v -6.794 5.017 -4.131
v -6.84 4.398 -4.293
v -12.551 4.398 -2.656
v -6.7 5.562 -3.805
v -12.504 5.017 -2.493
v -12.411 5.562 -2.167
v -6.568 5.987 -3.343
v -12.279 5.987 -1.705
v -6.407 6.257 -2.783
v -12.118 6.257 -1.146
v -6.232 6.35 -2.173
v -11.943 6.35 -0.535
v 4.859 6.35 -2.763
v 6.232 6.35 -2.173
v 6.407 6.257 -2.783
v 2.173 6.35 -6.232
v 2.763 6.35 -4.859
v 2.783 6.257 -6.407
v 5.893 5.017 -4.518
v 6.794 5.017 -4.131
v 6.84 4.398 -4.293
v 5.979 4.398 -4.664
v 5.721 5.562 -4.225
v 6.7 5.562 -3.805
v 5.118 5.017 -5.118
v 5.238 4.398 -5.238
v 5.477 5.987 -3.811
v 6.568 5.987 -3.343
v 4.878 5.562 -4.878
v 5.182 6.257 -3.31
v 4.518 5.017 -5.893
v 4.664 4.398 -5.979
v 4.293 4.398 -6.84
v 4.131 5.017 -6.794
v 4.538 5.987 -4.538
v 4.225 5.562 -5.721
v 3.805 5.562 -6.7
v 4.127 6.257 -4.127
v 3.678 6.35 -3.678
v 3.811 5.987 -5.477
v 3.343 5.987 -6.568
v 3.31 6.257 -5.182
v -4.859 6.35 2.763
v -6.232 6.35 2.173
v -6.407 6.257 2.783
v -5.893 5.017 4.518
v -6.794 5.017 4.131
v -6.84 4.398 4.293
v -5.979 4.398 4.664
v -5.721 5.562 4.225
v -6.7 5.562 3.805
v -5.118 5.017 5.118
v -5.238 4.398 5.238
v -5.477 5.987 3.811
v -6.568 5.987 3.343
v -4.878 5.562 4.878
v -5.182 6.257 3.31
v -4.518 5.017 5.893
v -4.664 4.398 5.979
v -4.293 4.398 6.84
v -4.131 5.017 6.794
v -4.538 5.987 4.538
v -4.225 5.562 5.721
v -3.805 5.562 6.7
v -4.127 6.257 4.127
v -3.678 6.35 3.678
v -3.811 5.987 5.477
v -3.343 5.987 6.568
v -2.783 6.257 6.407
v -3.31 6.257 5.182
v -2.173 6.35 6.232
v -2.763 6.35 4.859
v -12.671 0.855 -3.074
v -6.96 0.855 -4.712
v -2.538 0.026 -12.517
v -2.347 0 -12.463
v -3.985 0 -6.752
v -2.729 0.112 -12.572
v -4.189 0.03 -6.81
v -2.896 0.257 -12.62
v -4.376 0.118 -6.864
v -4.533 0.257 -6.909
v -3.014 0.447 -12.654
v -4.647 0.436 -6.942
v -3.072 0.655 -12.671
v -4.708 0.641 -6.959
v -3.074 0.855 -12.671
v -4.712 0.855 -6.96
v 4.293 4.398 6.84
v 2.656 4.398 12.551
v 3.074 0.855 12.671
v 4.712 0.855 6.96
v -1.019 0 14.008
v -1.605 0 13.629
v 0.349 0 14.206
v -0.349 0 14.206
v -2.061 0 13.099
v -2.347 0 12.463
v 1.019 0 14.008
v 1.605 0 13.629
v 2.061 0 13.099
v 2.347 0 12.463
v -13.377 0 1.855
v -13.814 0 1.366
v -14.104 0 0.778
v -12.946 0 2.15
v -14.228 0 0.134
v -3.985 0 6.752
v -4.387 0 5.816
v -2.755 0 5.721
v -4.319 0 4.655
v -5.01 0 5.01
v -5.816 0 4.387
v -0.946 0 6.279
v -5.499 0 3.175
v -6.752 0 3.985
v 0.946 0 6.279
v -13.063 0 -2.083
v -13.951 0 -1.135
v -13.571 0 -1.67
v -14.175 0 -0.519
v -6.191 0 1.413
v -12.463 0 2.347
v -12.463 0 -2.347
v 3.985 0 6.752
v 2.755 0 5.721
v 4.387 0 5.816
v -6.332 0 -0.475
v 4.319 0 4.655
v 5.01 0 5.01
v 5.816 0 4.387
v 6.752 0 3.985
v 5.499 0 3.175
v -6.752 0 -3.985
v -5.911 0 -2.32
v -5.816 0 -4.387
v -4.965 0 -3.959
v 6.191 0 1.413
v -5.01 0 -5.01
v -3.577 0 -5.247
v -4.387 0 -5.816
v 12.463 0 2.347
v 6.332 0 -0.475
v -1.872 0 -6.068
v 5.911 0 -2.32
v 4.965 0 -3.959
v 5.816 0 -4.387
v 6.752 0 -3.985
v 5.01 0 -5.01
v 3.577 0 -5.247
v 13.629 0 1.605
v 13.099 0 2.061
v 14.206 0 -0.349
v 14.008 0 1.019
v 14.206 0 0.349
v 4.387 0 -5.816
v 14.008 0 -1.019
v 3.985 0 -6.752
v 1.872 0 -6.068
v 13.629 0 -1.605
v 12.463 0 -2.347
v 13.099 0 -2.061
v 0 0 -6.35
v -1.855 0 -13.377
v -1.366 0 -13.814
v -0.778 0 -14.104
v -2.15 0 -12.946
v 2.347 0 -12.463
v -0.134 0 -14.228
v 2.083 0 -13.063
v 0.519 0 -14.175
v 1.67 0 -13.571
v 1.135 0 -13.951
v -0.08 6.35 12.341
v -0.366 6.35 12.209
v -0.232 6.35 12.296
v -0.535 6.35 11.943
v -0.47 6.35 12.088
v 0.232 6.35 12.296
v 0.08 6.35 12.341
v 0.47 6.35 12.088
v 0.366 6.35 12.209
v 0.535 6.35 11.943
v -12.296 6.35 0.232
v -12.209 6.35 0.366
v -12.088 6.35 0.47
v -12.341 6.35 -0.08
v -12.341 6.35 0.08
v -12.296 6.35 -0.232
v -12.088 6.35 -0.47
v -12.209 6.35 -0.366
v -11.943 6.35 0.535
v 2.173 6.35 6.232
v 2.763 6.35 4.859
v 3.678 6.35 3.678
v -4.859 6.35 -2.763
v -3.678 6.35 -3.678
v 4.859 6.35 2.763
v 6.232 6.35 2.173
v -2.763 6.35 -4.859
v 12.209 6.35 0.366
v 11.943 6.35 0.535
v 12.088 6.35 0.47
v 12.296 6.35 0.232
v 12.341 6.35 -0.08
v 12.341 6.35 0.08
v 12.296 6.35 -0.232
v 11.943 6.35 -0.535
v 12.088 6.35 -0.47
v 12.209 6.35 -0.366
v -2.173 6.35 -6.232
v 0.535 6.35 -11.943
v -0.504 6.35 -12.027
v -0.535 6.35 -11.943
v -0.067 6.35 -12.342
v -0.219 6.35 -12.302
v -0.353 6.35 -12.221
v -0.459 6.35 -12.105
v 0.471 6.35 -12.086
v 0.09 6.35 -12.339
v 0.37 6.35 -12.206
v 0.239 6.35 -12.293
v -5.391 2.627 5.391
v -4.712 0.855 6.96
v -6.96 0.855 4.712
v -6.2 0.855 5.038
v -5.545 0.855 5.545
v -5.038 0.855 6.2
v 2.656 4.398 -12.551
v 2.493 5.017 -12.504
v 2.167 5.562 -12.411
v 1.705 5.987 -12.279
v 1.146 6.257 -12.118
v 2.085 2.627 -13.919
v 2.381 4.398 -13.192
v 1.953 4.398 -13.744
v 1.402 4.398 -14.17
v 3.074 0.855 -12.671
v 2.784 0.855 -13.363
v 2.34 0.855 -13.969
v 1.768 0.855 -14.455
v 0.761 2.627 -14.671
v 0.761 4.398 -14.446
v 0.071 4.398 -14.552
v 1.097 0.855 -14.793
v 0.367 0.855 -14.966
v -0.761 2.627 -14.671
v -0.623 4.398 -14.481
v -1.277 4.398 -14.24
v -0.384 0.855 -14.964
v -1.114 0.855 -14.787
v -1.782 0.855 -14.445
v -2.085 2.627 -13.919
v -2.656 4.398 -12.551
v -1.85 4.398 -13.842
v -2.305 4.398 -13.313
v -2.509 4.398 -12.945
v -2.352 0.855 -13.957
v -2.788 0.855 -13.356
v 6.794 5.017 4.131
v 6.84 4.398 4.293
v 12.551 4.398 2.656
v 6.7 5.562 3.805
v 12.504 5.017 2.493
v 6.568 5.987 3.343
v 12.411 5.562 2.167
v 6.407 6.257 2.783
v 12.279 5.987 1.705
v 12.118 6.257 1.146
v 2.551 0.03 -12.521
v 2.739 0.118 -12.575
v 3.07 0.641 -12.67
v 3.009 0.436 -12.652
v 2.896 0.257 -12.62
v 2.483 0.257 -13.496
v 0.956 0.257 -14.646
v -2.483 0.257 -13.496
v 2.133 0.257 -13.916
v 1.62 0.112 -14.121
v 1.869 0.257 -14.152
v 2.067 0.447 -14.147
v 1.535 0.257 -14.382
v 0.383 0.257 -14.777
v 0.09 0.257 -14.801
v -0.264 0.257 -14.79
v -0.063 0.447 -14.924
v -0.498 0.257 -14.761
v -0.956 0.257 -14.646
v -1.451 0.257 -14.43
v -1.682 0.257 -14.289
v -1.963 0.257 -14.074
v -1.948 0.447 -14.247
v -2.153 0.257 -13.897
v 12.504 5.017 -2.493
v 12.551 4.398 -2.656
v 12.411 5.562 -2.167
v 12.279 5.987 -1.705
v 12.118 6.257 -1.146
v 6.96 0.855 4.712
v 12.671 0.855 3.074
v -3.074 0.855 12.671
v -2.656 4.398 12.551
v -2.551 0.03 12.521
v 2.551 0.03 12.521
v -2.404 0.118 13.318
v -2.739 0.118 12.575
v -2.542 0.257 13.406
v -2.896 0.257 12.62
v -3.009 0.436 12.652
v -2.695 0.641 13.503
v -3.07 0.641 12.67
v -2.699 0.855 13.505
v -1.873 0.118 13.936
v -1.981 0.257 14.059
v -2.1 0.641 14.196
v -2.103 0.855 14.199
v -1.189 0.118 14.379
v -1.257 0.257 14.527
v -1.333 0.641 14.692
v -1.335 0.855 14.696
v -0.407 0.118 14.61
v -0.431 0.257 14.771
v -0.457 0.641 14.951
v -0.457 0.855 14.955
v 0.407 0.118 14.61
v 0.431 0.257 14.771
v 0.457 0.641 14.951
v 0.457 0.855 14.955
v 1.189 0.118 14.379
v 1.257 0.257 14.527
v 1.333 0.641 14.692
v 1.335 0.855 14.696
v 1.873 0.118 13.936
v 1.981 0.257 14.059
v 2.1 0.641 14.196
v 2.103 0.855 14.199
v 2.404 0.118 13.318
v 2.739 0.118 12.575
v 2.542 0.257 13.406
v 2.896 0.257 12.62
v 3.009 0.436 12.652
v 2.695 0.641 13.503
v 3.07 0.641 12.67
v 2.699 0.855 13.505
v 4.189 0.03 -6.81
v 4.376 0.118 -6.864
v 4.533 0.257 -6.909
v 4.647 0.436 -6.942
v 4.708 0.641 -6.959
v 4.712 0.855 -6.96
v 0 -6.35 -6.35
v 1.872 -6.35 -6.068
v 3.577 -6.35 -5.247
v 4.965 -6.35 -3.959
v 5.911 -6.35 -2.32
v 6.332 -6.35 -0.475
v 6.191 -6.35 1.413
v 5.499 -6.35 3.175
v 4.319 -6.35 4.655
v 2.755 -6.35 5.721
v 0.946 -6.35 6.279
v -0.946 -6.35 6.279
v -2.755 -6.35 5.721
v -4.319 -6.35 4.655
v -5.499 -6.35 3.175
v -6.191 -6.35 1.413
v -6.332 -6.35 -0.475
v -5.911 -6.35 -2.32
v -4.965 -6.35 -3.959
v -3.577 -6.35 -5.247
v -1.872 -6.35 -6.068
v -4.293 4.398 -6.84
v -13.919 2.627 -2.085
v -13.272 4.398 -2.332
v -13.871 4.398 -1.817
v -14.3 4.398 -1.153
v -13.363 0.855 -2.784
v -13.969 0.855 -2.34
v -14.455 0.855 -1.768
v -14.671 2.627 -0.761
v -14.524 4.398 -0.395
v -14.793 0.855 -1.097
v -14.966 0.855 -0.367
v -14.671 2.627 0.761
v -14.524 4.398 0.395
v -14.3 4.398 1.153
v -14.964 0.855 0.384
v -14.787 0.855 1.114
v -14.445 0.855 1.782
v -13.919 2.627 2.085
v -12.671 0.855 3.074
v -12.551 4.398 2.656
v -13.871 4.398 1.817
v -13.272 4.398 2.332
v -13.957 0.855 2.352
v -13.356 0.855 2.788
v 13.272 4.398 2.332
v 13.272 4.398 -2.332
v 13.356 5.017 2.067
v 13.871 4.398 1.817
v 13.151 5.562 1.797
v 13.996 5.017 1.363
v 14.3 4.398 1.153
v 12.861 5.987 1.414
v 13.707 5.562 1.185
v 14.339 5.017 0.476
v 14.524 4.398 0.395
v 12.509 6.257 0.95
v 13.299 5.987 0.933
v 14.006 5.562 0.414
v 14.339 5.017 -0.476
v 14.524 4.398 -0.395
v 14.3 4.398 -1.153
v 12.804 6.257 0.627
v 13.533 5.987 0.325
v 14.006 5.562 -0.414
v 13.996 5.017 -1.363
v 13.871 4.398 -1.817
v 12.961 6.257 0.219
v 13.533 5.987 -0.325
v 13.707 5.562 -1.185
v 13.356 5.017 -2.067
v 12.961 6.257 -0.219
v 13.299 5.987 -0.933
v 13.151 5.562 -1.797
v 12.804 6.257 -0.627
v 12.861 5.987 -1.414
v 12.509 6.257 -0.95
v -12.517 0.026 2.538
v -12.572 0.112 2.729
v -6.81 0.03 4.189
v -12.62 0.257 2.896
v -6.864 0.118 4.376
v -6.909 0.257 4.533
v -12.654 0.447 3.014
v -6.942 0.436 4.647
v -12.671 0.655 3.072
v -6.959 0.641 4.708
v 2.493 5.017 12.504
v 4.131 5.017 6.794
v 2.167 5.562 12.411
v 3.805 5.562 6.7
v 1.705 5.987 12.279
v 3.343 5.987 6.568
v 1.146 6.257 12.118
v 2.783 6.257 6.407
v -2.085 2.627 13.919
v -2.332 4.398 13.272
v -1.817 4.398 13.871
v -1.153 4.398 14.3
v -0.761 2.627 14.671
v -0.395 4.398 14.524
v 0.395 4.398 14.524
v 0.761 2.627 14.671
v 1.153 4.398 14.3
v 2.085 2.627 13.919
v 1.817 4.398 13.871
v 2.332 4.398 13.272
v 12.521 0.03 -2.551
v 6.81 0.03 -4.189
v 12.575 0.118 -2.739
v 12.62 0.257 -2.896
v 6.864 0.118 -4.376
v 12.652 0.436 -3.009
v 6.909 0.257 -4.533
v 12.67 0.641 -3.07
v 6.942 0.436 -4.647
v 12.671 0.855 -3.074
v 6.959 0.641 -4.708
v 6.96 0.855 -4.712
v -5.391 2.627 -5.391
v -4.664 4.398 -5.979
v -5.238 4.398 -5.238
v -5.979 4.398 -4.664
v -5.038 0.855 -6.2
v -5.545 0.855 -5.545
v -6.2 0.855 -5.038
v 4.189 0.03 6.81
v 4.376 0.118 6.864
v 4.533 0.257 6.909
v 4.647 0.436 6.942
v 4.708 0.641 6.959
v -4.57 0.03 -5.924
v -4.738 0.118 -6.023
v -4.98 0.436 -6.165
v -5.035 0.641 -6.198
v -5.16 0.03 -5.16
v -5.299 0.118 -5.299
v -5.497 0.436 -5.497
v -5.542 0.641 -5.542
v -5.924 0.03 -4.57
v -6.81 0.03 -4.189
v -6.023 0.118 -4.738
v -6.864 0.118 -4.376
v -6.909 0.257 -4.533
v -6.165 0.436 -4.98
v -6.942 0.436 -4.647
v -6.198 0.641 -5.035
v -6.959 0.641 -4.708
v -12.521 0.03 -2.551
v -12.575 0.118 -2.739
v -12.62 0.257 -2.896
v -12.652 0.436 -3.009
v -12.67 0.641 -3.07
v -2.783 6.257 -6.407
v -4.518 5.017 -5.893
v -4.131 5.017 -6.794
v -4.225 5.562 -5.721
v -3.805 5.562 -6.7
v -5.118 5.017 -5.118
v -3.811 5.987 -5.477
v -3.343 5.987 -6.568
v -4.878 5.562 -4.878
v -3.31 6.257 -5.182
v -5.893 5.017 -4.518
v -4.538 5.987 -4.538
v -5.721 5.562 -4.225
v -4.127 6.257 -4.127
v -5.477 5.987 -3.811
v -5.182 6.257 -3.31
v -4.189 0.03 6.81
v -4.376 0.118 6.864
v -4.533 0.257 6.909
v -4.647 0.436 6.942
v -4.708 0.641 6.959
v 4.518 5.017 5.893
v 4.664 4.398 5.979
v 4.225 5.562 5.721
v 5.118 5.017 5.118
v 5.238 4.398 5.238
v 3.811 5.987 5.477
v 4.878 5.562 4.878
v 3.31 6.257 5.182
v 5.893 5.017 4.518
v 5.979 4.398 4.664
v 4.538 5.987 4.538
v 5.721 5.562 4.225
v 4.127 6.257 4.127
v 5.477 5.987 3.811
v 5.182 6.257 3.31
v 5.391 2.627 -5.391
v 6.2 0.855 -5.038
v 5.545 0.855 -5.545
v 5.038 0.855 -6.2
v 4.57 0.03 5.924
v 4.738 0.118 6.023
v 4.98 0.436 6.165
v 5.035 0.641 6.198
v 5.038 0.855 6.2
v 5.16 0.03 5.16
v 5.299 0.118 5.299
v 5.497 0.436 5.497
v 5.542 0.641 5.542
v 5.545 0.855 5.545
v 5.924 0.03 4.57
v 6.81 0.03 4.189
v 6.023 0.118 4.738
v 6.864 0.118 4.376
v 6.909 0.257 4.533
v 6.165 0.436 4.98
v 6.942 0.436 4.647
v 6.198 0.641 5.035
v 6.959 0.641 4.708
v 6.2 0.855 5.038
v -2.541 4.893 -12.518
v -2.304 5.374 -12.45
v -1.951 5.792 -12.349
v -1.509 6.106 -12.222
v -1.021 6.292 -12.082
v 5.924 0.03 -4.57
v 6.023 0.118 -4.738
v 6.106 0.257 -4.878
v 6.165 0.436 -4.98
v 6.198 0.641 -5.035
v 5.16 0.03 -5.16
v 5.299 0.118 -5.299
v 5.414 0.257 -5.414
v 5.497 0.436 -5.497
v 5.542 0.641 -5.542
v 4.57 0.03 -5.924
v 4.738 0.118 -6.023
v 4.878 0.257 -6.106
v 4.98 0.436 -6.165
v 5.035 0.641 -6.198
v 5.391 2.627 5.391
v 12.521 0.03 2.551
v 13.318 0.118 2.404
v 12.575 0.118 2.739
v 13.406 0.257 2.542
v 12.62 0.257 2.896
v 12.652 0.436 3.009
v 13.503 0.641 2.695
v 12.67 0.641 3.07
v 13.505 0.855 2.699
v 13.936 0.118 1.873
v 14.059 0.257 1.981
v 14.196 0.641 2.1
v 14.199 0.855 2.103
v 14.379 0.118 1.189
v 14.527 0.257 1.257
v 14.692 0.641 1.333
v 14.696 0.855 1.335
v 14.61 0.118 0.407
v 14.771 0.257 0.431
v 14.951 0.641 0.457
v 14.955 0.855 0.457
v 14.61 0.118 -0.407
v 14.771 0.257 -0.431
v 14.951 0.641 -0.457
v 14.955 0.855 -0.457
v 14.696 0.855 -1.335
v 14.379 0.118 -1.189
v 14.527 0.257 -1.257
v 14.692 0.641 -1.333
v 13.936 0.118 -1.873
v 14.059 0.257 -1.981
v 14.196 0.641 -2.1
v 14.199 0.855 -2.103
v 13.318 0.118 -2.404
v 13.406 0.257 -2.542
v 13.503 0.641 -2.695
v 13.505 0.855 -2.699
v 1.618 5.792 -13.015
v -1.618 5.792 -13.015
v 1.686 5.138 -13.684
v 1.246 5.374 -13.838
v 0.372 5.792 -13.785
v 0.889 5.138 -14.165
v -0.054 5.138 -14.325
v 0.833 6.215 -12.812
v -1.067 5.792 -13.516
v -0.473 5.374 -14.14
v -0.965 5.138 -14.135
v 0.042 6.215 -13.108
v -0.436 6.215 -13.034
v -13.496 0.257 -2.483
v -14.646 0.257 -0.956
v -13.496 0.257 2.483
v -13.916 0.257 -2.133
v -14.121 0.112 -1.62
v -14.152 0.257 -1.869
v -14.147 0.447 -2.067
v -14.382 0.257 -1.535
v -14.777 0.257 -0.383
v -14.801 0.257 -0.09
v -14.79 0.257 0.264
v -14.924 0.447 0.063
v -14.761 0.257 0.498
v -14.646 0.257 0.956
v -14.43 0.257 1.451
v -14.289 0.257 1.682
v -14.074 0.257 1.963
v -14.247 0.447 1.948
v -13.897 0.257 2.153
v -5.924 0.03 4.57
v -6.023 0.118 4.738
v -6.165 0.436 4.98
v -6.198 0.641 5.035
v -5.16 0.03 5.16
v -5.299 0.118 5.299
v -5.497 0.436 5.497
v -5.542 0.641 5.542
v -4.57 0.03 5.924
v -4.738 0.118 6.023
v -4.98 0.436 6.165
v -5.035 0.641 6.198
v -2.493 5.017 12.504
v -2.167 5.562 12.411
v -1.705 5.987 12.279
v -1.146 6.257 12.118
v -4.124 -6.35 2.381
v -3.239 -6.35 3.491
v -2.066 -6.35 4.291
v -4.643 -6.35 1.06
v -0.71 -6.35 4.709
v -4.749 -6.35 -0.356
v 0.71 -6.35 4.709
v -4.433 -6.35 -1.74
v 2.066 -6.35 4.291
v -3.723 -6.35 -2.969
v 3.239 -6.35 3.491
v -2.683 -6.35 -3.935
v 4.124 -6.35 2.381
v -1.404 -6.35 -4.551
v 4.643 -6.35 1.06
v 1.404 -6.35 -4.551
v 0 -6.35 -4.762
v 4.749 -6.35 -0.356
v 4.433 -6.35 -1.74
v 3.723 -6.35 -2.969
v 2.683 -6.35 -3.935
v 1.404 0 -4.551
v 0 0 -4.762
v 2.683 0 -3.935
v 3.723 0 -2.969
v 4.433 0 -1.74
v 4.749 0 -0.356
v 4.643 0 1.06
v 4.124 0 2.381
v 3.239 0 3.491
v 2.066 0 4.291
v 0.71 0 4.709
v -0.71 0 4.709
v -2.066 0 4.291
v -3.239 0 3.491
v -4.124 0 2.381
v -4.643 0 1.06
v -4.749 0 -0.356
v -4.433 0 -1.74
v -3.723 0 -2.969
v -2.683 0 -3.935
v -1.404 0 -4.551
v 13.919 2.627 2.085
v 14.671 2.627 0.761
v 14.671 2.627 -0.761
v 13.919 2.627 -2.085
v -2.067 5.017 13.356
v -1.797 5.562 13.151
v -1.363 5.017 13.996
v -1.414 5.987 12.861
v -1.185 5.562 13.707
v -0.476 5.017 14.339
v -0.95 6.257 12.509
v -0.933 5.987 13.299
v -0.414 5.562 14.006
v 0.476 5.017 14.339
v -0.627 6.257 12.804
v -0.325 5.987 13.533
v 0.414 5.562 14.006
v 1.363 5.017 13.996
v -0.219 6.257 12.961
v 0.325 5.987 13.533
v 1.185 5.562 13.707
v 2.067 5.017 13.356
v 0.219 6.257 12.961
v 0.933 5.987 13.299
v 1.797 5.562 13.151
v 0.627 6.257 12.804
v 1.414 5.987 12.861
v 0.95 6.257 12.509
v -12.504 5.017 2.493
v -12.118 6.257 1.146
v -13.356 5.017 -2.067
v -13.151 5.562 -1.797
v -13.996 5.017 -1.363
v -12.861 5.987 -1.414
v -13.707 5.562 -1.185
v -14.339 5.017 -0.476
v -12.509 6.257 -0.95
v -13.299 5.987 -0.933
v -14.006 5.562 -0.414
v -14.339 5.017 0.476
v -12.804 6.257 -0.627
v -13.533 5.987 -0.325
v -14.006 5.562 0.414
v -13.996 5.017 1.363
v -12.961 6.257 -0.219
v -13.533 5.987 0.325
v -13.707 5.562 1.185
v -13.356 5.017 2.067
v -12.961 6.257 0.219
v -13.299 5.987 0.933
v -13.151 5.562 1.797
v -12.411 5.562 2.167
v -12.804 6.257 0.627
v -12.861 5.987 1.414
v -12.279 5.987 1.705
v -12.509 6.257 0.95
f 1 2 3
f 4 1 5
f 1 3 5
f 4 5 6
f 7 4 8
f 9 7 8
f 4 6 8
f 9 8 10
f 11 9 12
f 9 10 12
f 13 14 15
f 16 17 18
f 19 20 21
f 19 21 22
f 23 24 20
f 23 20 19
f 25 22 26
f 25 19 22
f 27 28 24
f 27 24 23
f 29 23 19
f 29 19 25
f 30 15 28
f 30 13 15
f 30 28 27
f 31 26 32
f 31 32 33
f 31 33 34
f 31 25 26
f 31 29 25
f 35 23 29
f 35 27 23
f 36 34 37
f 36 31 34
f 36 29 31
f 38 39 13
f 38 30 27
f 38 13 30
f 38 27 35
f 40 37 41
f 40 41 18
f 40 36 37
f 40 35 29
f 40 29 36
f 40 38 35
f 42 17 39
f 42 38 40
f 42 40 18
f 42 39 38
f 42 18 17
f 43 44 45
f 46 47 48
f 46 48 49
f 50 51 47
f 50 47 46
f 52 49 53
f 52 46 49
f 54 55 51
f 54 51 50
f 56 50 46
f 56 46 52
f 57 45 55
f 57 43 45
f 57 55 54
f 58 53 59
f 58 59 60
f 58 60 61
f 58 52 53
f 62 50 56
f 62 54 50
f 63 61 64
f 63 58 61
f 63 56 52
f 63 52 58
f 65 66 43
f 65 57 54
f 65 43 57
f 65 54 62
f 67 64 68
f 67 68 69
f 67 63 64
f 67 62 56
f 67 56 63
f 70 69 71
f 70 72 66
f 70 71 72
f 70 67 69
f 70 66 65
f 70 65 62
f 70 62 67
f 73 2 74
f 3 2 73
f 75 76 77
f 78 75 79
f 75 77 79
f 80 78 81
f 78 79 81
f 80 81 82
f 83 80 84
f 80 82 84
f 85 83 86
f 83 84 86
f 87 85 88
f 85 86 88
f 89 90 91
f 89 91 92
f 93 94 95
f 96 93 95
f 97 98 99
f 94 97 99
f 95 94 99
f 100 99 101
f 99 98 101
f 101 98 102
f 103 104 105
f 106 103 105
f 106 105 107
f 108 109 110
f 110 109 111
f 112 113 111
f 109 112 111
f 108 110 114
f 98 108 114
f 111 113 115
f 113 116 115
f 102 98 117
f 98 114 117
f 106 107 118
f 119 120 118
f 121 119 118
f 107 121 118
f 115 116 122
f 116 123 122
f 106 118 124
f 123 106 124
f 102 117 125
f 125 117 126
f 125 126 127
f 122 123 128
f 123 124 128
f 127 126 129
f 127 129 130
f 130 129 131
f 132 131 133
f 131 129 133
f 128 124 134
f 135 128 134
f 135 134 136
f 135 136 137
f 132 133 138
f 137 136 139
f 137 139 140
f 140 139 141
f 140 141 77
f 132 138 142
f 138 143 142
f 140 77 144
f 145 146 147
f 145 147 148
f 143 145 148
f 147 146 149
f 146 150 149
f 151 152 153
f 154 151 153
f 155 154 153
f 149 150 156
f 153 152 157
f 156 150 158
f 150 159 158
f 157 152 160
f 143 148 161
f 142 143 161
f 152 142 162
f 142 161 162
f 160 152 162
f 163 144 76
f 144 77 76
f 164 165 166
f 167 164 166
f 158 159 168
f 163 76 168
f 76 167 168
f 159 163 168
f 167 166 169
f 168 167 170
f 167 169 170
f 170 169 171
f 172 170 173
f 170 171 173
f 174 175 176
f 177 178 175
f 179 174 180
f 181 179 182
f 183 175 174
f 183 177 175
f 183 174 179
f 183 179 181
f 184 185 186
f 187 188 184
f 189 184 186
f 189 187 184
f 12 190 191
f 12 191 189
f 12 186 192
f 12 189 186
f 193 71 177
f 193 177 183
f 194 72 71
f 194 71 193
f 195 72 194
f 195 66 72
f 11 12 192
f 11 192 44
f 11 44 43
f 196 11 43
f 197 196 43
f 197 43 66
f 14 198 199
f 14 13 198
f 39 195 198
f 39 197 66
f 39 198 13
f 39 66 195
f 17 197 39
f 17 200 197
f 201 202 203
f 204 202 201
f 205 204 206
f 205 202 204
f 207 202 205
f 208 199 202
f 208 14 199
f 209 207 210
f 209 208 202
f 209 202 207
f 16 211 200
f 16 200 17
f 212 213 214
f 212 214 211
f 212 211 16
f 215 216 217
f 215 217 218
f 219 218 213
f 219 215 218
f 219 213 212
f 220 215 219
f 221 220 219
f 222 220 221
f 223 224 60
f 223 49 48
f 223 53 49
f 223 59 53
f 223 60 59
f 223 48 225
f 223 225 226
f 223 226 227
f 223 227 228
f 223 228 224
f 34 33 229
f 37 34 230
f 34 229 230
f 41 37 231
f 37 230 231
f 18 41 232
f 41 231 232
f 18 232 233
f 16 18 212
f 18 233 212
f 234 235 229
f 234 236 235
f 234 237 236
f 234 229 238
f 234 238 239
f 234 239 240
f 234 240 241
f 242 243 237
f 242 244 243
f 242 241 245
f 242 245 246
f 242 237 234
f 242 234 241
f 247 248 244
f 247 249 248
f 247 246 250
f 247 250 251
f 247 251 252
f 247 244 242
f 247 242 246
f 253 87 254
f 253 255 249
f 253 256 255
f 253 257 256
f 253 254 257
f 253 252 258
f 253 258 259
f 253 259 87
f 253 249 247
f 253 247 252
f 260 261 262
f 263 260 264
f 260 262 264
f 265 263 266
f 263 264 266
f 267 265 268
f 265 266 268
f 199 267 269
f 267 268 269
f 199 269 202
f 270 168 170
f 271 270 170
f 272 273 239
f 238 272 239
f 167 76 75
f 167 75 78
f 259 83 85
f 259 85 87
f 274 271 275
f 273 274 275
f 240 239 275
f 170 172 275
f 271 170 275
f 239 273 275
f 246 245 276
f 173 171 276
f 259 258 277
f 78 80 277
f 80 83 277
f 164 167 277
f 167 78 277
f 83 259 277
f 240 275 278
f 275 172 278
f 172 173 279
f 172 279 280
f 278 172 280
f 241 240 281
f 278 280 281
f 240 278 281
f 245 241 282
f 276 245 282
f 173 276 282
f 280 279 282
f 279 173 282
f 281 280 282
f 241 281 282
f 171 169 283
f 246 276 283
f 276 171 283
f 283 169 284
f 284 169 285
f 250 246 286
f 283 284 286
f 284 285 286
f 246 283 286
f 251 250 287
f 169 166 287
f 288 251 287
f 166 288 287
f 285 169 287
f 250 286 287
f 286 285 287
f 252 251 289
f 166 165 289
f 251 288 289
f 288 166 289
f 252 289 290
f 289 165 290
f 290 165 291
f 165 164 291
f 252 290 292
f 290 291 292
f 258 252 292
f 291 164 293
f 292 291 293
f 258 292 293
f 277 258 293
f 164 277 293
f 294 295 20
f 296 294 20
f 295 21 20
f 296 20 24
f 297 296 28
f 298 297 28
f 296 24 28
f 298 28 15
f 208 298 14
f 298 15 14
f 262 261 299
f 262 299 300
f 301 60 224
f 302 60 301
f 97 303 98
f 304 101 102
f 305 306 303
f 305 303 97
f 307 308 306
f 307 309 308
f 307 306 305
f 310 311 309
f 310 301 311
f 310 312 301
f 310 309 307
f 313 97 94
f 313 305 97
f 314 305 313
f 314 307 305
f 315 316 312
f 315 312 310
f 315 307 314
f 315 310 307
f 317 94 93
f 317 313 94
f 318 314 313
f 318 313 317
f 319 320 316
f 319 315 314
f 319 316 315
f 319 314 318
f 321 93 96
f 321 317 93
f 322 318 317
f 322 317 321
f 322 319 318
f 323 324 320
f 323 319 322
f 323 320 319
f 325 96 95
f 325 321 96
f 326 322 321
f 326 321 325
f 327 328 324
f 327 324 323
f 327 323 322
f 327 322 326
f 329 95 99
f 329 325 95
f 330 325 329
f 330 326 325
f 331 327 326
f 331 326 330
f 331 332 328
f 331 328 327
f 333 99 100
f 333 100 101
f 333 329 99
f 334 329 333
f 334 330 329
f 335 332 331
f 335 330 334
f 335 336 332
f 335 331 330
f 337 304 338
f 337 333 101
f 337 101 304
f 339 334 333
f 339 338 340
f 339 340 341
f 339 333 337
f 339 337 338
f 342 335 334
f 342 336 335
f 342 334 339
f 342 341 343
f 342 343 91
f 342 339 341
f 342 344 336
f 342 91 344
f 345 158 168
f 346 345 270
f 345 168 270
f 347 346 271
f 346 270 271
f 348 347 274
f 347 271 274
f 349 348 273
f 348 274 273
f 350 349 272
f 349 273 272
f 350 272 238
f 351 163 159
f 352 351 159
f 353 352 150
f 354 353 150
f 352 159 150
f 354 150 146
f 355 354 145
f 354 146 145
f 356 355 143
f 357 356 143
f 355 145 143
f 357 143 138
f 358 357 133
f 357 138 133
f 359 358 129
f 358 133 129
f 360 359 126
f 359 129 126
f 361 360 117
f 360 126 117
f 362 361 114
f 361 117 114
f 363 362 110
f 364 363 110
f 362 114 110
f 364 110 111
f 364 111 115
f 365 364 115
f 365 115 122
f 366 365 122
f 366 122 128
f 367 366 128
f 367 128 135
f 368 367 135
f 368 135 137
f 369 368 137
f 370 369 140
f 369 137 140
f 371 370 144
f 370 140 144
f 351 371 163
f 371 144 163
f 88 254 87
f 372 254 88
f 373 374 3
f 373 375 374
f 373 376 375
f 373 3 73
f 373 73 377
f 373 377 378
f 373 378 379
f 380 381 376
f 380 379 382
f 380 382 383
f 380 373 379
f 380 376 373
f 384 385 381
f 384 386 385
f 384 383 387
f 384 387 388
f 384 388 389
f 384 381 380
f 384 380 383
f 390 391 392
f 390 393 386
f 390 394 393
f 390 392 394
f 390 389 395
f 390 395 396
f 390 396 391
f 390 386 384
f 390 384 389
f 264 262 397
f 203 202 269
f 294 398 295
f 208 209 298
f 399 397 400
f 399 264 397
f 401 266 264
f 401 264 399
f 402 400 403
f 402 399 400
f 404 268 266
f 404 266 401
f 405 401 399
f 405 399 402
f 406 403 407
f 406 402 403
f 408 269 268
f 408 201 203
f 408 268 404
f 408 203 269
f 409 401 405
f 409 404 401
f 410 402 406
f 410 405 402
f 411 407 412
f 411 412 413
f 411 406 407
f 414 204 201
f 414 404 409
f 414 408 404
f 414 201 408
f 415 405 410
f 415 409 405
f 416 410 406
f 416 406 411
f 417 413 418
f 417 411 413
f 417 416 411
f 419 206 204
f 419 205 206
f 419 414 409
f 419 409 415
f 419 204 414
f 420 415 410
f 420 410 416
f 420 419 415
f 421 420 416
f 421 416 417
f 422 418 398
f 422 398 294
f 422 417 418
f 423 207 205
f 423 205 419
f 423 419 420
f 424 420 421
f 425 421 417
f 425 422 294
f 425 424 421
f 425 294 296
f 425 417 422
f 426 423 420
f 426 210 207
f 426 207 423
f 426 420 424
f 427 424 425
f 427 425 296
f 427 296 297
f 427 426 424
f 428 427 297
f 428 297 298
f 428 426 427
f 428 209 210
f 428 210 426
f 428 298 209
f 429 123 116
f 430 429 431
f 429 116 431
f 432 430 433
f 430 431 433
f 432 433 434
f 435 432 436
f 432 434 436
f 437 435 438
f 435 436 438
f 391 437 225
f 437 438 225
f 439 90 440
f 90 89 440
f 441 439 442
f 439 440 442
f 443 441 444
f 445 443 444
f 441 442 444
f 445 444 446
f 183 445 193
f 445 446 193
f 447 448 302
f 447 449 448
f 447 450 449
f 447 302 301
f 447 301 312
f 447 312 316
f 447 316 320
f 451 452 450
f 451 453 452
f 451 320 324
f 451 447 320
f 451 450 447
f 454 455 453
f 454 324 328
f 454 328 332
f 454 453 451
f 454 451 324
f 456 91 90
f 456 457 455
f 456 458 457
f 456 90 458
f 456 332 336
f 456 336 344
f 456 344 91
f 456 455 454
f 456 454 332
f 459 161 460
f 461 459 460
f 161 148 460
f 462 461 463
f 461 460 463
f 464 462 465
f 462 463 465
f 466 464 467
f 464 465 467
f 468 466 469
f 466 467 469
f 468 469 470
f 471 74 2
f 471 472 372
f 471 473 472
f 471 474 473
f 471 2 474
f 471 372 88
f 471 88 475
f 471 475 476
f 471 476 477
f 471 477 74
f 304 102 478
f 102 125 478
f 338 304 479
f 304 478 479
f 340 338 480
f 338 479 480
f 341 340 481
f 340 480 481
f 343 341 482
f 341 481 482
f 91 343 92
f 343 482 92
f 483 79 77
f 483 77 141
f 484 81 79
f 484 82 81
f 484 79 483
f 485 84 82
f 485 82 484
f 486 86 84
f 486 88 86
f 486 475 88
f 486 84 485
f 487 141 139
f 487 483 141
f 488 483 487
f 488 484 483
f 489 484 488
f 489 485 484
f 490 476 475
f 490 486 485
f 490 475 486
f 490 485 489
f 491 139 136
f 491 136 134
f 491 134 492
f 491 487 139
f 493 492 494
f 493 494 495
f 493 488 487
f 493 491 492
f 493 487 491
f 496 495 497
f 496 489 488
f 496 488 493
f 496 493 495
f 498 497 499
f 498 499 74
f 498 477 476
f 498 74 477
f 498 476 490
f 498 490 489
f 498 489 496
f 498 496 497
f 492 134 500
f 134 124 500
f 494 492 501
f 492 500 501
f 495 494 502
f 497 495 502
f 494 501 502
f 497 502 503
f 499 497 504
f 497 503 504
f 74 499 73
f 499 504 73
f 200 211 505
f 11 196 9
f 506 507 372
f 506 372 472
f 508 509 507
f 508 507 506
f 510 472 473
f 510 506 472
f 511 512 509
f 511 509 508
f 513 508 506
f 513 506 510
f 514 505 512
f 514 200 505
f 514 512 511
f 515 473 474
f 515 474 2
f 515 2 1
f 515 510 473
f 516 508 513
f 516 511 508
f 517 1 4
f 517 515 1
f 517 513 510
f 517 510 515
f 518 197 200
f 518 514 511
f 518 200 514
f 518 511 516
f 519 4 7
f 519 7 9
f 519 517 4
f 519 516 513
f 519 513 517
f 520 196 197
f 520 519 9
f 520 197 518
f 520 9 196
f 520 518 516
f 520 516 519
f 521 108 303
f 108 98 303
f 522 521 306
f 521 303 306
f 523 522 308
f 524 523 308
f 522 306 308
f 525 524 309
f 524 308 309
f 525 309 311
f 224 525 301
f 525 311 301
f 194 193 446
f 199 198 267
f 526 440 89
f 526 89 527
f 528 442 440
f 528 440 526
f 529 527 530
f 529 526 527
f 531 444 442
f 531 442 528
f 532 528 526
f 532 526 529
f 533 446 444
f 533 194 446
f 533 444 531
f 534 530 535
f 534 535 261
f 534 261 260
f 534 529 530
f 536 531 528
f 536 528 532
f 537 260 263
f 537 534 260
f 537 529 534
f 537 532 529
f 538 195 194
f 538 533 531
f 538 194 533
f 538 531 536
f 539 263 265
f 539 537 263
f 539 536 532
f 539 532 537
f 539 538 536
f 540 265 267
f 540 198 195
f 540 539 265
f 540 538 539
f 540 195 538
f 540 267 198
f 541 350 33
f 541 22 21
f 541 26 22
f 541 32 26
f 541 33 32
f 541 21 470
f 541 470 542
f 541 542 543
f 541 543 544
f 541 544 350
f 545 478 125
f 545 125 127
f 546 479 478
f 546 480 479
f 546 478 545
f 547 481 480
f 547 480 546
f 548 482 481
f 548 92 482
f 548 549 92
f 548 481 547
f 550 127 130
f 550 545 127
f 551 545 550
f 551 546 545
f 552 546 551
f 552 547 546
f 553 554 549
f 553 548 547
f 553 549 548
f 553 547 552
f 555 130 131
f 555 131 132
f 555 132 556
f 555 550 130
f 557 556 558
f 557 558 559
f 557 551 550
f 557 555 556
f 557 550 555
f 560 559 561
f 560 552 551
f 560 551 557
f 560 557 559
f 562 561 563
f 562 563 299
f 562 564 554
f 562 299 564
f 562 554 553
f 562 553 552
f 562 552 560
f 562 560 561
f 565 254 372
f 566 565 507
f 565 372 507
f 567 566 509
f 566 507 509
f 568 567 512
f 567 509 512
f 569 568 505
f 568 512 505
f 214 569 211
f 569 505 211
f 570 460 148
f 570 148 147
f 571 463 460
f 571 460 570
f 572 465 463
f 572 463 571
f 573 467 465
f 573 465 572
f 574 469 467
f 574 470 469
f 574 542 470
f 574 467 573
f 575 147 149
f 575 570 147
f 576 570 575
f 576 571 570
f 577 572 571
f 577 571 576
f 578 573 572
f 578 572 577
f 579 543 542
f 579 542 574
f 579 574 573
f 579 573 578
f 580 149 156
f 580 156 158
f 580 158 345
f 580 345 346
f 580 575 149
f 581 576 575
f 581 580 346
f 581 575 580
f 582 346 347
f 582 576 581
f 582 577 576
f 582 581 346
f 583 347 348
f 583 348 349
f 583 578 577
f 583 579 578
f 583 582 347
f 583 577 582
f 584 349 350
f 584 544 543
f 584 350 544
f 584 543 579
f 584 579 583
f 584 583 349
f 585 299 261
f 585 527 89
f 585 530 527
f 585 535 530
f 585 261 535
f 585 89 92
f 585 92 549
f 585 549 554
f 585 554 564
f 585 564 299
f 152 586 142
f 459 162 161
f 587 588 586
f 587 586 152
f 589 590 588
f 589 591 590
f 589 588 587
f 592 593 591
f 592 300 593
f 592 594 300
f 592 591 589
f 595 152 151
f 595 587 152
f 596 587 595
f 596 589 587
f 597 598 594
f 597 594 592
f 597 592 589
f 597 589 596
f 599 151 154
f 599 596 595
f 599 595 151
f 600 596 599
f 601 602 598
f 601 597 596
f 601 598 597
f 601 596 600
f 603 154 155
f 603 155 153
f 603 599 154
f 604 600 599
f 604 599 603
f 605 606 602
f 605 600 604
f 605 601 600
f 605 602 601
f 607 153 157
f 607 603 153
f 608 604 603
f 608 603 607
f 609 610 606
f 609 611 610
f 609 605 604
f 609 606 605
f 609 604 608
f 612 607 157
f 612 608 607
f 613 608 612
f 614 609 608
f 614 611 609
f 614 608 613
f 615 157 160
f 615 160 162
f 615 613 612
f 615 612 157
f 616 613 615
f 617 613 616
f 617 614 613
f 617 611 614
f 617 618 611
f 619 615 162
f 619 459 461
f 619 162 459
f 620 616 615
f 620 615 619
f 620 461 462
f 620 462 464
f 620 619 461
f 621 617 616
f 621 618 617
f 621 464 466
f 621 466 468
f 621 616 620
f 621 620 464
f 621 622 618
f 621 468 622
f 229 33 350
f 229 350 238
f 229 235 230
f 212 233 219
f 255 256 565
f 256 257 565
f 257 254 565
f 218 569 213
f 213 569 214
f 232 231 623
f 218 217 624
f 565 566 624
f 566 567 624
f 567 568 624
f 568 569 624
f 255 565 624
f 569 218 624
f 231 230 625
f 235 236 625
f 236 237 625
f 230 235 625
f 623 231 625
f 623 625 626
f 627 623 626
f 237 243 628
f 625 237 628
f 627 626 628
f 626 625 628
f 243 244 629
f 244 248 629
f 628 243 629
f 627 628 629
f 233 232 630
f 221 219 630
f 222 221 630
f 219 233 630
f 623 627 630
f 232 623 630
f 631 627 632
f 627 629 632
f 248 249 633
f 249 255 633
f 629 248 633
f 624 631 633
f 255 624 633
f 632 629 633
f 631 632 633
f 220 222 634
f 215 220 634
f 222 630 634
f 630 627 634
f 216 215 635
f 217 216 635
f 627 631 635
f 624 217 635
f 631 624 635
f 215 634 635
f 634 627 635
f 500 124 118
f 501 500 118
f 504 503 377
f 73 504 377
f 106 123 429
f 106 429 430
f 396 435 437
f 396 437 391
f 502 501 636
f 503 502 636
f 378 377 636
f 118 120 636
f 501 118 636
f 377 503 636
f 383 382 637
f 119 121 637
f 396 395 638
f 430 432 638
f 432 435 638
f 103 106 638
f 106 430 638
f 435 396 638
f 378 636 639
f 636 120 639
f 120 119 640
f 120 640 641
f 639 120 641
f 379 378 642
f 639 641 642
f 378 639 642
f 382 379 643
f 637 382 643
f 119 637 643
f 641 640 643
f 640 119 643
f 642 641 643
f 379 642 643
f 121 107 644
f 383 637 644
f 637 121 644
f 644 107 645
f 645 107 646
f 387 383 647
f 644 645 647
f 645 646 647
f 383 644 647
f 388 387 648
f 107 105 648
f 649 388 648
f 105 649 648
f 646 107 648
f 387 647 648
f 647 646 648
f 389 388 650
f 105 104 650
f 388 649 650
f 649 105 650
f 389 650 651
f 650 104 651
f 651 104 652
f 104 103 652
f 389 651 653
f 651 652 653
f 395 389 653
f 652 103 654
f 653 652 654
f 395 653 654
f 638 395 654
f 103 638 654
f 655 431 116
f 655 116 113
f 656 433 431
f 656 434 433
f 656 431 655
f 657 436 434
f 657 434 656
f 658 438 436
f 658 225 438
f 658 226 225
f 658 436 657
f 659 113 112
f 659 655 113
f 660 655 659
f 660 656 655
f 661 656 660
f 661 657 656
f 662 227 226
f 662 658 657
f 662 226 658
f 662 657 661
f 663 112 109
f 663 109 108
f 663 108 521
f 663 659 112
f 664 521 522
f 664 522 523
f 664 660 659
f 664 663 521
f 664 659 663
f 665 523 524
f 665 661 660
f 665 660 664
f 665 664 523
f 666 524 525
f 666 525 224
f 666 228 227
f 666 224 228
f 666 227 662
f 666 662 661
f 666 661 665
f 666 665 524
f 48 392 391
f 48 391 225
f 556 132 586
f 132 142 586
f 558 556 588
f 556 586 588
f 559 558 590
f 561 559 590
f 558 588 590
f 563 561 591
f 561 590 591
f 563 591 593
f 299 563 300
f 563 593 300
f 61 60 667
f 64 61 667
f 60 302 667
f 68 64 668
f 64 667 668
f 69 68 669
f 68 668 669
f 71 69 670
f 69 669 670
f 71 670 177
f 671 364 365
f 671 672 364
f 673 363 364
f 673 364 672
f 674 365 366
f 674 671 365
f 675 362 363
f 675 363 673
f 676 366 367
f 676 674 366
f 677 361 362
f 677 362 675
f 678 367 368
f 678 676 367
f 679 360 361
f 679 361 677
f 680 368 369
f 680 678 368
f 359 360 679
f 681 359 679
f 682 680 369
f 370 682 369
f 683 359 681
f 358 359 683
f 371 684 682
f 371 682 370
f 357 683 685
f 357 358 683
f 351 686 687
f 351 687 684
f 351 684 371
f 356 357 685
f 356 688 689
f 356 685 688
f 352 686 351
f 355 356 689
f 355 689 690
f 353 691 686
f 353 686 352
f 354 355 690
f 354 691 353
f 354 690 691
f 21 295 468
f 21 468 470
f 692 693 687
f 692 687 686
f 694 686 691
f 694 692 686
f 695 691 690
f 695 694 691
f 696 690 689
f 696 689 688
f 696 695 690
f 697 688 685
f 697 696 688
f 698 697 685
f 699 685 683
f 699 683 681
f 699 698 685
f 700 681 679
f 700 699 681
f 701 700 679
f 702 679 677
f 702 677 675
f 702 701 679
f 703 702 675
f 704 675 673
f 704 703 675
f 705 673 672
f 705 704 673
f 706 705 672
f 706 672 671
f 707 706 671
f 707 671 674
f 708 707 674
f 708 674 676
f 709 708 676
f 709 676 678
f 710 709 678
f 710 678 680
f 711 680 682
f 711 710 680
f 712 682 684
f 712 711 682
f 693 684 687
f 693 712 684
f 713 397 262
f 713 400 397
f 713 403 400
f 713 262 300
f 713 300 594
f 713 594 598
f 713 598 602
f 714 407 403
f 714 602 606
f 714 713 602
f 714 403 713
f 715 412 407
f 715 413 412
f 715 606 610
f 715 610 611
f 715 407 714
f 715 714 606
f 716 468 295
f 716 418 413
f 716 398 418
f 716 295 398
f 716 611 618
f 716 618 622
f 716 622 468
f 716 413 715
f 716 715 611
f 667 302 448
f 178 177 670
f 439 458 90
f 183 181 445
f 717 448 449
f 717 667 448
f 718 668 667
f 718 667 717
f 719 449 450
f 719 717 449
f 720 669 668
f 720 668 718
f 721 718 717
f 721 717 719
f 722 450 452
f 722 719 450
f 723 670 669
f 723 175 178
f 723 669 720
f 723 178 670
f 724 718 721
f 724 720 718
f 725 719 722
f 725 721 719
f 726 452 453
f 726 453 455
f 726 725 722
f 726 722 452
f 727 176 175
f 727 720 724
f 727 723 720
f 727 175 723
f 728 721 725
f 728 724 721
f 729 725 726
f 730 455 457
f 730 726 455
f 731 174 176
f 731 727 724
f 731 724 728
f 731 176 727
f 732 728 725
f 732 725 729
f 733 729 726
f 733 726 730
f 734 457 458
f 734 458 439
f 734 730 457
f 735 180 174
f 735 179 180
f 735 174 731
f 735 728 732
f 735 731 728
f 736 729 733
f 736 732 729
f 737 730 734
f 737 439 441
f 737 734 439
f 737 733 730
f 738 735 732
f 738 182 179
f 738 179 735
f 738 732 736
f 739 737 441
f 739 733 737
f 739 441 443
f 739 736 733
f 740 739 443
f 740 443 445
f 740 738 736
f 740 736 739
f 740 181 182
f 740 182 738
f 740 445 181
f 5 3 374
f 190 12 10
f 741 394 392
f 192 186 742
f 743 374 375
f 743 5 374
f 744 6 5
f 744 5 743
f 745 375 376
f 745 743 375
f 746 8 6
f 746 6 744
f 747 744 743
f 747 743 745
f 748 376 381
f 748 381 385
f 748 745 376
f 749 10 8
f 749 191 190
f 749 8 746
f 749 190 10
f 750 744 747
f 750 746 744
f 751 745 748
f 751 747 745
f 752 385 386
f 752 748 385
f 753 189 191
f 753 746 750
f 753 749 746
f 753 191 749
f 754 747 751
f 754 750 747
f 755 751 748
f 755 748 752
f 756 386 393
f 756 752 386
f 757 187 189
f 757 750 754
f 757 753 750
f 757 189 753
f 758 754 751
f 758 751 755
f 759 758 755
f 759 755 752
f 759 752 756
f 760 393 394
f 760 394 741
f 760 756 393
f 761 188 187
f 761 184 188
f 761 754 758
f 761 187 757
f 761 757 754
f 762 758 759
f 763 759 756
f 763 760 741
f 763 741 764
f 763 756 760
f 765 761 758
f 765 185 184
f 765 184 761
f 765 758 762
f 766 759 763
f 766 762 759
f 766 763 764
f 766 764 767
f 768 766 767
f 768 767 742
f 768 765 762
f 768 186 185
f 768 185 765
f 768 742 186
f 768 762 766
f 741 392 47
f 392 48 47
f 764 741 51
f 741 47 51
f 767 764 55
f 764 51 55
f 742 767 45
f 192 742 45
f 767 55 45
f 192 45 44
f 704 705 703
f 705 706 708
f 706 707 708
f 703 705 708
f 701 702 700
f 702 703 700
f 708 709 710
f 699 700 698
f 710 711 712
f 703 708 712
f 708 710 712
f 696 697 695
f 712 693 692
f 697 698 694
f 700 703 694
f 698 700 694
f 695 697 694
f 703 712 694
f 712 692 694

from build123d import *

# Parameters (mm, degrees)
EXTRUDE1_DEPTH = 6.35
EXTRUDE1_TAPER = 7.000000000000015
FILLET1_R      = 2.2224999999999997
SKETCH2_R      = 6.35
SKETCH2_R_2    = 4.7625
EXTRUDE2_DEPTH = 6.35
FILLET2_R      = 0.762


with BuildPart() as part:
    # Sketch1 → Extrude1 (new body)
    with BuildSketch(Plane(origin=(0, 0, 0), x_dir=(1, 0, 0), z_dir=(0, 1, 0))):
        with BuildLine():
            ThreePointArc((3.174999999999997, 12.7), (2.4e-15, 15.092534109076349), (-3.17499999999998, 12.7))
            Line((-3.17499999999998, 12.7), (-4.812500349494196, 6.989357629379411))
            ThreePointArc((-4.812500349494196, 6.989357629379411), (-5.619442203831074, 5.619442203831092), (-6.989357629379396, 4.812500349494221))
            Line((-6.989357629379396, 4.812500349494221), (-12.699999999999969, 3.1750000000000442))
            ThreePointArc((-12.699999999999969, 3.1750000000000442), (-15.092534109076396, -4e-16), (-12.699999999999969, -3.1750000000000442))
            Line((-12.699999999999969, -3.1750000000000442), (-6.989357629379396, -4.812500349494221))
            ThreePointArc((-6.989357629379396, -4.812500349494221), (-5.619442203831074, -5.619442203831092), (-4.812500349494196, -6.989357629379411))
            Line((-4.812500349494196, -6.989357629379411), (-3.17499999999998, -12.7))
            ThreePointArc((-3.17499999999998, -12.7), (3.14e-15, -15.092534109076366), (3.174999999999997, -12.7))
            Line((3.174999999999997, -12.7), (4.812500349494196, -6.989357629379411))
            ThreePointArc((4.812500349494196, -6.989357629379411), (5.619442203831074, -5.619442203831092), (6.989357629379396, -4.812500349494221))
            Line((6.989357629379396, -4.812500349494221), (12.699999999999985, -3.1750000000000442))
            ThreePointArc((12.699999999999985, -3.1750000000000442), (15.0925341090764, 0), (12.699999999999985, 3.1750000000000442))
            Line((12.699999999999985, 3.1750000000000442), (6.989357629379396, 4.812500349494221))
            ThreePointArc((6.989357629379396, 4.812500349494221), (5.619442203831074, 5.619442203831092), (4.812500349494196, 6.989357629379411))
            Line((4.812500349494196, 6.989357629379411), (3.174999999999997, 12.7))
        make_face()
    extrude(amount=EXTRUDE1_DEPTH, taper=EXTRUDE1_TAPER)

    # Fillet1
    fillet1_edges = [part.edges().sort_by_distance(p)[0] for p in [
        (3.2442717699186887, 6.35, 9.629769340379289),
        (5.068123801520522, 6.35, 5.068123801520543),
        (9.629769340379273, 6.35, 3.244271769918725),
        (14.312852147342955, 6.35, 1.33e-15),
        (9.629769340379273, 6.35, -3.2442717699187247),
        (5.068123801520526, 6.35, -5.06812380152054),
        (3.2442717699186923, 6.35, -9.629769340379278),
        (1.443e-14, 6.35, -14.312852147342902),
        (-3.2442717699186843, 6.35, -9.629769340379275),
        (-5.068123801520527, 6.35, -5.068123801520538),
        (-9.629769340379273, 6.35, -3.244271769918723),
        (-14.31285214734295, 6.35, 2.2e-16),
        (-9.629769340379273, 6.35, 3.244271769918723),
        (-5.068123801520526, 6.35, 5.06812380152054),
        (-3.2442717699186803, 6.35, 9.629769340379287),
        (1.155e-14, 6.35, 14.312852147342921),
    ]]
    fillet(fillet1_edges, radius=FILLET1_R)

    # Sketch2 → Extrude2 (add)
    with BuildSketch(Plane.XZ):
        with Locations(Location((0, 0, 0), (0, 0, 270))):
            Circle(SKETCH2_R)
        with Locations(Location((0, 0, 0), (0, 0, 270))):
            Circle(SKETCH2_R_2, mode=Mode.SUBTRACT)
    extrude(amount=EXTRUDE2_DEPTH)

    # Fillet2
    fillet2_edges = [part.edges().sort_by_distance(p)[0] for p in [
        (3.9937501747470967, 0, 9.844678814689704),
        (5.619442203831073, 0, 5.619442203831092),
        (7.99e-15, 0, 15.092534109076366),
        (-3.993750174747088, 0, 9.844678814689704),
        (9.84467881468969, 0, 3.9937501747471327),
        (-5.619442203831074, 0, 5.619442203831092),
        (15.0925341090764, 0, 3.3e-16),
        (-9.844678814689683, 0, 3.9937501747471327),
        (9.84467881468969, 0, -3.9937501747471327),
        (-15.092534109076396, 0, -3.3e-16),
        (5.619442203831074, 0, -5.619442203831092),
        (-9.844678814689683, 0, -3.9937501747471327),
        (3.9937501747470967, 0, -9.844678814689704),
        (-5.619442203831073, 0, -5.619442203831092),
        (8.88e-15, 0, -15.092534109076349),
        (-3.9937501747470883, 0, -9.844678814689704),
    ]]
    fillet(fillet2_edges, radius=FILLET2_R)


solid = part.part
